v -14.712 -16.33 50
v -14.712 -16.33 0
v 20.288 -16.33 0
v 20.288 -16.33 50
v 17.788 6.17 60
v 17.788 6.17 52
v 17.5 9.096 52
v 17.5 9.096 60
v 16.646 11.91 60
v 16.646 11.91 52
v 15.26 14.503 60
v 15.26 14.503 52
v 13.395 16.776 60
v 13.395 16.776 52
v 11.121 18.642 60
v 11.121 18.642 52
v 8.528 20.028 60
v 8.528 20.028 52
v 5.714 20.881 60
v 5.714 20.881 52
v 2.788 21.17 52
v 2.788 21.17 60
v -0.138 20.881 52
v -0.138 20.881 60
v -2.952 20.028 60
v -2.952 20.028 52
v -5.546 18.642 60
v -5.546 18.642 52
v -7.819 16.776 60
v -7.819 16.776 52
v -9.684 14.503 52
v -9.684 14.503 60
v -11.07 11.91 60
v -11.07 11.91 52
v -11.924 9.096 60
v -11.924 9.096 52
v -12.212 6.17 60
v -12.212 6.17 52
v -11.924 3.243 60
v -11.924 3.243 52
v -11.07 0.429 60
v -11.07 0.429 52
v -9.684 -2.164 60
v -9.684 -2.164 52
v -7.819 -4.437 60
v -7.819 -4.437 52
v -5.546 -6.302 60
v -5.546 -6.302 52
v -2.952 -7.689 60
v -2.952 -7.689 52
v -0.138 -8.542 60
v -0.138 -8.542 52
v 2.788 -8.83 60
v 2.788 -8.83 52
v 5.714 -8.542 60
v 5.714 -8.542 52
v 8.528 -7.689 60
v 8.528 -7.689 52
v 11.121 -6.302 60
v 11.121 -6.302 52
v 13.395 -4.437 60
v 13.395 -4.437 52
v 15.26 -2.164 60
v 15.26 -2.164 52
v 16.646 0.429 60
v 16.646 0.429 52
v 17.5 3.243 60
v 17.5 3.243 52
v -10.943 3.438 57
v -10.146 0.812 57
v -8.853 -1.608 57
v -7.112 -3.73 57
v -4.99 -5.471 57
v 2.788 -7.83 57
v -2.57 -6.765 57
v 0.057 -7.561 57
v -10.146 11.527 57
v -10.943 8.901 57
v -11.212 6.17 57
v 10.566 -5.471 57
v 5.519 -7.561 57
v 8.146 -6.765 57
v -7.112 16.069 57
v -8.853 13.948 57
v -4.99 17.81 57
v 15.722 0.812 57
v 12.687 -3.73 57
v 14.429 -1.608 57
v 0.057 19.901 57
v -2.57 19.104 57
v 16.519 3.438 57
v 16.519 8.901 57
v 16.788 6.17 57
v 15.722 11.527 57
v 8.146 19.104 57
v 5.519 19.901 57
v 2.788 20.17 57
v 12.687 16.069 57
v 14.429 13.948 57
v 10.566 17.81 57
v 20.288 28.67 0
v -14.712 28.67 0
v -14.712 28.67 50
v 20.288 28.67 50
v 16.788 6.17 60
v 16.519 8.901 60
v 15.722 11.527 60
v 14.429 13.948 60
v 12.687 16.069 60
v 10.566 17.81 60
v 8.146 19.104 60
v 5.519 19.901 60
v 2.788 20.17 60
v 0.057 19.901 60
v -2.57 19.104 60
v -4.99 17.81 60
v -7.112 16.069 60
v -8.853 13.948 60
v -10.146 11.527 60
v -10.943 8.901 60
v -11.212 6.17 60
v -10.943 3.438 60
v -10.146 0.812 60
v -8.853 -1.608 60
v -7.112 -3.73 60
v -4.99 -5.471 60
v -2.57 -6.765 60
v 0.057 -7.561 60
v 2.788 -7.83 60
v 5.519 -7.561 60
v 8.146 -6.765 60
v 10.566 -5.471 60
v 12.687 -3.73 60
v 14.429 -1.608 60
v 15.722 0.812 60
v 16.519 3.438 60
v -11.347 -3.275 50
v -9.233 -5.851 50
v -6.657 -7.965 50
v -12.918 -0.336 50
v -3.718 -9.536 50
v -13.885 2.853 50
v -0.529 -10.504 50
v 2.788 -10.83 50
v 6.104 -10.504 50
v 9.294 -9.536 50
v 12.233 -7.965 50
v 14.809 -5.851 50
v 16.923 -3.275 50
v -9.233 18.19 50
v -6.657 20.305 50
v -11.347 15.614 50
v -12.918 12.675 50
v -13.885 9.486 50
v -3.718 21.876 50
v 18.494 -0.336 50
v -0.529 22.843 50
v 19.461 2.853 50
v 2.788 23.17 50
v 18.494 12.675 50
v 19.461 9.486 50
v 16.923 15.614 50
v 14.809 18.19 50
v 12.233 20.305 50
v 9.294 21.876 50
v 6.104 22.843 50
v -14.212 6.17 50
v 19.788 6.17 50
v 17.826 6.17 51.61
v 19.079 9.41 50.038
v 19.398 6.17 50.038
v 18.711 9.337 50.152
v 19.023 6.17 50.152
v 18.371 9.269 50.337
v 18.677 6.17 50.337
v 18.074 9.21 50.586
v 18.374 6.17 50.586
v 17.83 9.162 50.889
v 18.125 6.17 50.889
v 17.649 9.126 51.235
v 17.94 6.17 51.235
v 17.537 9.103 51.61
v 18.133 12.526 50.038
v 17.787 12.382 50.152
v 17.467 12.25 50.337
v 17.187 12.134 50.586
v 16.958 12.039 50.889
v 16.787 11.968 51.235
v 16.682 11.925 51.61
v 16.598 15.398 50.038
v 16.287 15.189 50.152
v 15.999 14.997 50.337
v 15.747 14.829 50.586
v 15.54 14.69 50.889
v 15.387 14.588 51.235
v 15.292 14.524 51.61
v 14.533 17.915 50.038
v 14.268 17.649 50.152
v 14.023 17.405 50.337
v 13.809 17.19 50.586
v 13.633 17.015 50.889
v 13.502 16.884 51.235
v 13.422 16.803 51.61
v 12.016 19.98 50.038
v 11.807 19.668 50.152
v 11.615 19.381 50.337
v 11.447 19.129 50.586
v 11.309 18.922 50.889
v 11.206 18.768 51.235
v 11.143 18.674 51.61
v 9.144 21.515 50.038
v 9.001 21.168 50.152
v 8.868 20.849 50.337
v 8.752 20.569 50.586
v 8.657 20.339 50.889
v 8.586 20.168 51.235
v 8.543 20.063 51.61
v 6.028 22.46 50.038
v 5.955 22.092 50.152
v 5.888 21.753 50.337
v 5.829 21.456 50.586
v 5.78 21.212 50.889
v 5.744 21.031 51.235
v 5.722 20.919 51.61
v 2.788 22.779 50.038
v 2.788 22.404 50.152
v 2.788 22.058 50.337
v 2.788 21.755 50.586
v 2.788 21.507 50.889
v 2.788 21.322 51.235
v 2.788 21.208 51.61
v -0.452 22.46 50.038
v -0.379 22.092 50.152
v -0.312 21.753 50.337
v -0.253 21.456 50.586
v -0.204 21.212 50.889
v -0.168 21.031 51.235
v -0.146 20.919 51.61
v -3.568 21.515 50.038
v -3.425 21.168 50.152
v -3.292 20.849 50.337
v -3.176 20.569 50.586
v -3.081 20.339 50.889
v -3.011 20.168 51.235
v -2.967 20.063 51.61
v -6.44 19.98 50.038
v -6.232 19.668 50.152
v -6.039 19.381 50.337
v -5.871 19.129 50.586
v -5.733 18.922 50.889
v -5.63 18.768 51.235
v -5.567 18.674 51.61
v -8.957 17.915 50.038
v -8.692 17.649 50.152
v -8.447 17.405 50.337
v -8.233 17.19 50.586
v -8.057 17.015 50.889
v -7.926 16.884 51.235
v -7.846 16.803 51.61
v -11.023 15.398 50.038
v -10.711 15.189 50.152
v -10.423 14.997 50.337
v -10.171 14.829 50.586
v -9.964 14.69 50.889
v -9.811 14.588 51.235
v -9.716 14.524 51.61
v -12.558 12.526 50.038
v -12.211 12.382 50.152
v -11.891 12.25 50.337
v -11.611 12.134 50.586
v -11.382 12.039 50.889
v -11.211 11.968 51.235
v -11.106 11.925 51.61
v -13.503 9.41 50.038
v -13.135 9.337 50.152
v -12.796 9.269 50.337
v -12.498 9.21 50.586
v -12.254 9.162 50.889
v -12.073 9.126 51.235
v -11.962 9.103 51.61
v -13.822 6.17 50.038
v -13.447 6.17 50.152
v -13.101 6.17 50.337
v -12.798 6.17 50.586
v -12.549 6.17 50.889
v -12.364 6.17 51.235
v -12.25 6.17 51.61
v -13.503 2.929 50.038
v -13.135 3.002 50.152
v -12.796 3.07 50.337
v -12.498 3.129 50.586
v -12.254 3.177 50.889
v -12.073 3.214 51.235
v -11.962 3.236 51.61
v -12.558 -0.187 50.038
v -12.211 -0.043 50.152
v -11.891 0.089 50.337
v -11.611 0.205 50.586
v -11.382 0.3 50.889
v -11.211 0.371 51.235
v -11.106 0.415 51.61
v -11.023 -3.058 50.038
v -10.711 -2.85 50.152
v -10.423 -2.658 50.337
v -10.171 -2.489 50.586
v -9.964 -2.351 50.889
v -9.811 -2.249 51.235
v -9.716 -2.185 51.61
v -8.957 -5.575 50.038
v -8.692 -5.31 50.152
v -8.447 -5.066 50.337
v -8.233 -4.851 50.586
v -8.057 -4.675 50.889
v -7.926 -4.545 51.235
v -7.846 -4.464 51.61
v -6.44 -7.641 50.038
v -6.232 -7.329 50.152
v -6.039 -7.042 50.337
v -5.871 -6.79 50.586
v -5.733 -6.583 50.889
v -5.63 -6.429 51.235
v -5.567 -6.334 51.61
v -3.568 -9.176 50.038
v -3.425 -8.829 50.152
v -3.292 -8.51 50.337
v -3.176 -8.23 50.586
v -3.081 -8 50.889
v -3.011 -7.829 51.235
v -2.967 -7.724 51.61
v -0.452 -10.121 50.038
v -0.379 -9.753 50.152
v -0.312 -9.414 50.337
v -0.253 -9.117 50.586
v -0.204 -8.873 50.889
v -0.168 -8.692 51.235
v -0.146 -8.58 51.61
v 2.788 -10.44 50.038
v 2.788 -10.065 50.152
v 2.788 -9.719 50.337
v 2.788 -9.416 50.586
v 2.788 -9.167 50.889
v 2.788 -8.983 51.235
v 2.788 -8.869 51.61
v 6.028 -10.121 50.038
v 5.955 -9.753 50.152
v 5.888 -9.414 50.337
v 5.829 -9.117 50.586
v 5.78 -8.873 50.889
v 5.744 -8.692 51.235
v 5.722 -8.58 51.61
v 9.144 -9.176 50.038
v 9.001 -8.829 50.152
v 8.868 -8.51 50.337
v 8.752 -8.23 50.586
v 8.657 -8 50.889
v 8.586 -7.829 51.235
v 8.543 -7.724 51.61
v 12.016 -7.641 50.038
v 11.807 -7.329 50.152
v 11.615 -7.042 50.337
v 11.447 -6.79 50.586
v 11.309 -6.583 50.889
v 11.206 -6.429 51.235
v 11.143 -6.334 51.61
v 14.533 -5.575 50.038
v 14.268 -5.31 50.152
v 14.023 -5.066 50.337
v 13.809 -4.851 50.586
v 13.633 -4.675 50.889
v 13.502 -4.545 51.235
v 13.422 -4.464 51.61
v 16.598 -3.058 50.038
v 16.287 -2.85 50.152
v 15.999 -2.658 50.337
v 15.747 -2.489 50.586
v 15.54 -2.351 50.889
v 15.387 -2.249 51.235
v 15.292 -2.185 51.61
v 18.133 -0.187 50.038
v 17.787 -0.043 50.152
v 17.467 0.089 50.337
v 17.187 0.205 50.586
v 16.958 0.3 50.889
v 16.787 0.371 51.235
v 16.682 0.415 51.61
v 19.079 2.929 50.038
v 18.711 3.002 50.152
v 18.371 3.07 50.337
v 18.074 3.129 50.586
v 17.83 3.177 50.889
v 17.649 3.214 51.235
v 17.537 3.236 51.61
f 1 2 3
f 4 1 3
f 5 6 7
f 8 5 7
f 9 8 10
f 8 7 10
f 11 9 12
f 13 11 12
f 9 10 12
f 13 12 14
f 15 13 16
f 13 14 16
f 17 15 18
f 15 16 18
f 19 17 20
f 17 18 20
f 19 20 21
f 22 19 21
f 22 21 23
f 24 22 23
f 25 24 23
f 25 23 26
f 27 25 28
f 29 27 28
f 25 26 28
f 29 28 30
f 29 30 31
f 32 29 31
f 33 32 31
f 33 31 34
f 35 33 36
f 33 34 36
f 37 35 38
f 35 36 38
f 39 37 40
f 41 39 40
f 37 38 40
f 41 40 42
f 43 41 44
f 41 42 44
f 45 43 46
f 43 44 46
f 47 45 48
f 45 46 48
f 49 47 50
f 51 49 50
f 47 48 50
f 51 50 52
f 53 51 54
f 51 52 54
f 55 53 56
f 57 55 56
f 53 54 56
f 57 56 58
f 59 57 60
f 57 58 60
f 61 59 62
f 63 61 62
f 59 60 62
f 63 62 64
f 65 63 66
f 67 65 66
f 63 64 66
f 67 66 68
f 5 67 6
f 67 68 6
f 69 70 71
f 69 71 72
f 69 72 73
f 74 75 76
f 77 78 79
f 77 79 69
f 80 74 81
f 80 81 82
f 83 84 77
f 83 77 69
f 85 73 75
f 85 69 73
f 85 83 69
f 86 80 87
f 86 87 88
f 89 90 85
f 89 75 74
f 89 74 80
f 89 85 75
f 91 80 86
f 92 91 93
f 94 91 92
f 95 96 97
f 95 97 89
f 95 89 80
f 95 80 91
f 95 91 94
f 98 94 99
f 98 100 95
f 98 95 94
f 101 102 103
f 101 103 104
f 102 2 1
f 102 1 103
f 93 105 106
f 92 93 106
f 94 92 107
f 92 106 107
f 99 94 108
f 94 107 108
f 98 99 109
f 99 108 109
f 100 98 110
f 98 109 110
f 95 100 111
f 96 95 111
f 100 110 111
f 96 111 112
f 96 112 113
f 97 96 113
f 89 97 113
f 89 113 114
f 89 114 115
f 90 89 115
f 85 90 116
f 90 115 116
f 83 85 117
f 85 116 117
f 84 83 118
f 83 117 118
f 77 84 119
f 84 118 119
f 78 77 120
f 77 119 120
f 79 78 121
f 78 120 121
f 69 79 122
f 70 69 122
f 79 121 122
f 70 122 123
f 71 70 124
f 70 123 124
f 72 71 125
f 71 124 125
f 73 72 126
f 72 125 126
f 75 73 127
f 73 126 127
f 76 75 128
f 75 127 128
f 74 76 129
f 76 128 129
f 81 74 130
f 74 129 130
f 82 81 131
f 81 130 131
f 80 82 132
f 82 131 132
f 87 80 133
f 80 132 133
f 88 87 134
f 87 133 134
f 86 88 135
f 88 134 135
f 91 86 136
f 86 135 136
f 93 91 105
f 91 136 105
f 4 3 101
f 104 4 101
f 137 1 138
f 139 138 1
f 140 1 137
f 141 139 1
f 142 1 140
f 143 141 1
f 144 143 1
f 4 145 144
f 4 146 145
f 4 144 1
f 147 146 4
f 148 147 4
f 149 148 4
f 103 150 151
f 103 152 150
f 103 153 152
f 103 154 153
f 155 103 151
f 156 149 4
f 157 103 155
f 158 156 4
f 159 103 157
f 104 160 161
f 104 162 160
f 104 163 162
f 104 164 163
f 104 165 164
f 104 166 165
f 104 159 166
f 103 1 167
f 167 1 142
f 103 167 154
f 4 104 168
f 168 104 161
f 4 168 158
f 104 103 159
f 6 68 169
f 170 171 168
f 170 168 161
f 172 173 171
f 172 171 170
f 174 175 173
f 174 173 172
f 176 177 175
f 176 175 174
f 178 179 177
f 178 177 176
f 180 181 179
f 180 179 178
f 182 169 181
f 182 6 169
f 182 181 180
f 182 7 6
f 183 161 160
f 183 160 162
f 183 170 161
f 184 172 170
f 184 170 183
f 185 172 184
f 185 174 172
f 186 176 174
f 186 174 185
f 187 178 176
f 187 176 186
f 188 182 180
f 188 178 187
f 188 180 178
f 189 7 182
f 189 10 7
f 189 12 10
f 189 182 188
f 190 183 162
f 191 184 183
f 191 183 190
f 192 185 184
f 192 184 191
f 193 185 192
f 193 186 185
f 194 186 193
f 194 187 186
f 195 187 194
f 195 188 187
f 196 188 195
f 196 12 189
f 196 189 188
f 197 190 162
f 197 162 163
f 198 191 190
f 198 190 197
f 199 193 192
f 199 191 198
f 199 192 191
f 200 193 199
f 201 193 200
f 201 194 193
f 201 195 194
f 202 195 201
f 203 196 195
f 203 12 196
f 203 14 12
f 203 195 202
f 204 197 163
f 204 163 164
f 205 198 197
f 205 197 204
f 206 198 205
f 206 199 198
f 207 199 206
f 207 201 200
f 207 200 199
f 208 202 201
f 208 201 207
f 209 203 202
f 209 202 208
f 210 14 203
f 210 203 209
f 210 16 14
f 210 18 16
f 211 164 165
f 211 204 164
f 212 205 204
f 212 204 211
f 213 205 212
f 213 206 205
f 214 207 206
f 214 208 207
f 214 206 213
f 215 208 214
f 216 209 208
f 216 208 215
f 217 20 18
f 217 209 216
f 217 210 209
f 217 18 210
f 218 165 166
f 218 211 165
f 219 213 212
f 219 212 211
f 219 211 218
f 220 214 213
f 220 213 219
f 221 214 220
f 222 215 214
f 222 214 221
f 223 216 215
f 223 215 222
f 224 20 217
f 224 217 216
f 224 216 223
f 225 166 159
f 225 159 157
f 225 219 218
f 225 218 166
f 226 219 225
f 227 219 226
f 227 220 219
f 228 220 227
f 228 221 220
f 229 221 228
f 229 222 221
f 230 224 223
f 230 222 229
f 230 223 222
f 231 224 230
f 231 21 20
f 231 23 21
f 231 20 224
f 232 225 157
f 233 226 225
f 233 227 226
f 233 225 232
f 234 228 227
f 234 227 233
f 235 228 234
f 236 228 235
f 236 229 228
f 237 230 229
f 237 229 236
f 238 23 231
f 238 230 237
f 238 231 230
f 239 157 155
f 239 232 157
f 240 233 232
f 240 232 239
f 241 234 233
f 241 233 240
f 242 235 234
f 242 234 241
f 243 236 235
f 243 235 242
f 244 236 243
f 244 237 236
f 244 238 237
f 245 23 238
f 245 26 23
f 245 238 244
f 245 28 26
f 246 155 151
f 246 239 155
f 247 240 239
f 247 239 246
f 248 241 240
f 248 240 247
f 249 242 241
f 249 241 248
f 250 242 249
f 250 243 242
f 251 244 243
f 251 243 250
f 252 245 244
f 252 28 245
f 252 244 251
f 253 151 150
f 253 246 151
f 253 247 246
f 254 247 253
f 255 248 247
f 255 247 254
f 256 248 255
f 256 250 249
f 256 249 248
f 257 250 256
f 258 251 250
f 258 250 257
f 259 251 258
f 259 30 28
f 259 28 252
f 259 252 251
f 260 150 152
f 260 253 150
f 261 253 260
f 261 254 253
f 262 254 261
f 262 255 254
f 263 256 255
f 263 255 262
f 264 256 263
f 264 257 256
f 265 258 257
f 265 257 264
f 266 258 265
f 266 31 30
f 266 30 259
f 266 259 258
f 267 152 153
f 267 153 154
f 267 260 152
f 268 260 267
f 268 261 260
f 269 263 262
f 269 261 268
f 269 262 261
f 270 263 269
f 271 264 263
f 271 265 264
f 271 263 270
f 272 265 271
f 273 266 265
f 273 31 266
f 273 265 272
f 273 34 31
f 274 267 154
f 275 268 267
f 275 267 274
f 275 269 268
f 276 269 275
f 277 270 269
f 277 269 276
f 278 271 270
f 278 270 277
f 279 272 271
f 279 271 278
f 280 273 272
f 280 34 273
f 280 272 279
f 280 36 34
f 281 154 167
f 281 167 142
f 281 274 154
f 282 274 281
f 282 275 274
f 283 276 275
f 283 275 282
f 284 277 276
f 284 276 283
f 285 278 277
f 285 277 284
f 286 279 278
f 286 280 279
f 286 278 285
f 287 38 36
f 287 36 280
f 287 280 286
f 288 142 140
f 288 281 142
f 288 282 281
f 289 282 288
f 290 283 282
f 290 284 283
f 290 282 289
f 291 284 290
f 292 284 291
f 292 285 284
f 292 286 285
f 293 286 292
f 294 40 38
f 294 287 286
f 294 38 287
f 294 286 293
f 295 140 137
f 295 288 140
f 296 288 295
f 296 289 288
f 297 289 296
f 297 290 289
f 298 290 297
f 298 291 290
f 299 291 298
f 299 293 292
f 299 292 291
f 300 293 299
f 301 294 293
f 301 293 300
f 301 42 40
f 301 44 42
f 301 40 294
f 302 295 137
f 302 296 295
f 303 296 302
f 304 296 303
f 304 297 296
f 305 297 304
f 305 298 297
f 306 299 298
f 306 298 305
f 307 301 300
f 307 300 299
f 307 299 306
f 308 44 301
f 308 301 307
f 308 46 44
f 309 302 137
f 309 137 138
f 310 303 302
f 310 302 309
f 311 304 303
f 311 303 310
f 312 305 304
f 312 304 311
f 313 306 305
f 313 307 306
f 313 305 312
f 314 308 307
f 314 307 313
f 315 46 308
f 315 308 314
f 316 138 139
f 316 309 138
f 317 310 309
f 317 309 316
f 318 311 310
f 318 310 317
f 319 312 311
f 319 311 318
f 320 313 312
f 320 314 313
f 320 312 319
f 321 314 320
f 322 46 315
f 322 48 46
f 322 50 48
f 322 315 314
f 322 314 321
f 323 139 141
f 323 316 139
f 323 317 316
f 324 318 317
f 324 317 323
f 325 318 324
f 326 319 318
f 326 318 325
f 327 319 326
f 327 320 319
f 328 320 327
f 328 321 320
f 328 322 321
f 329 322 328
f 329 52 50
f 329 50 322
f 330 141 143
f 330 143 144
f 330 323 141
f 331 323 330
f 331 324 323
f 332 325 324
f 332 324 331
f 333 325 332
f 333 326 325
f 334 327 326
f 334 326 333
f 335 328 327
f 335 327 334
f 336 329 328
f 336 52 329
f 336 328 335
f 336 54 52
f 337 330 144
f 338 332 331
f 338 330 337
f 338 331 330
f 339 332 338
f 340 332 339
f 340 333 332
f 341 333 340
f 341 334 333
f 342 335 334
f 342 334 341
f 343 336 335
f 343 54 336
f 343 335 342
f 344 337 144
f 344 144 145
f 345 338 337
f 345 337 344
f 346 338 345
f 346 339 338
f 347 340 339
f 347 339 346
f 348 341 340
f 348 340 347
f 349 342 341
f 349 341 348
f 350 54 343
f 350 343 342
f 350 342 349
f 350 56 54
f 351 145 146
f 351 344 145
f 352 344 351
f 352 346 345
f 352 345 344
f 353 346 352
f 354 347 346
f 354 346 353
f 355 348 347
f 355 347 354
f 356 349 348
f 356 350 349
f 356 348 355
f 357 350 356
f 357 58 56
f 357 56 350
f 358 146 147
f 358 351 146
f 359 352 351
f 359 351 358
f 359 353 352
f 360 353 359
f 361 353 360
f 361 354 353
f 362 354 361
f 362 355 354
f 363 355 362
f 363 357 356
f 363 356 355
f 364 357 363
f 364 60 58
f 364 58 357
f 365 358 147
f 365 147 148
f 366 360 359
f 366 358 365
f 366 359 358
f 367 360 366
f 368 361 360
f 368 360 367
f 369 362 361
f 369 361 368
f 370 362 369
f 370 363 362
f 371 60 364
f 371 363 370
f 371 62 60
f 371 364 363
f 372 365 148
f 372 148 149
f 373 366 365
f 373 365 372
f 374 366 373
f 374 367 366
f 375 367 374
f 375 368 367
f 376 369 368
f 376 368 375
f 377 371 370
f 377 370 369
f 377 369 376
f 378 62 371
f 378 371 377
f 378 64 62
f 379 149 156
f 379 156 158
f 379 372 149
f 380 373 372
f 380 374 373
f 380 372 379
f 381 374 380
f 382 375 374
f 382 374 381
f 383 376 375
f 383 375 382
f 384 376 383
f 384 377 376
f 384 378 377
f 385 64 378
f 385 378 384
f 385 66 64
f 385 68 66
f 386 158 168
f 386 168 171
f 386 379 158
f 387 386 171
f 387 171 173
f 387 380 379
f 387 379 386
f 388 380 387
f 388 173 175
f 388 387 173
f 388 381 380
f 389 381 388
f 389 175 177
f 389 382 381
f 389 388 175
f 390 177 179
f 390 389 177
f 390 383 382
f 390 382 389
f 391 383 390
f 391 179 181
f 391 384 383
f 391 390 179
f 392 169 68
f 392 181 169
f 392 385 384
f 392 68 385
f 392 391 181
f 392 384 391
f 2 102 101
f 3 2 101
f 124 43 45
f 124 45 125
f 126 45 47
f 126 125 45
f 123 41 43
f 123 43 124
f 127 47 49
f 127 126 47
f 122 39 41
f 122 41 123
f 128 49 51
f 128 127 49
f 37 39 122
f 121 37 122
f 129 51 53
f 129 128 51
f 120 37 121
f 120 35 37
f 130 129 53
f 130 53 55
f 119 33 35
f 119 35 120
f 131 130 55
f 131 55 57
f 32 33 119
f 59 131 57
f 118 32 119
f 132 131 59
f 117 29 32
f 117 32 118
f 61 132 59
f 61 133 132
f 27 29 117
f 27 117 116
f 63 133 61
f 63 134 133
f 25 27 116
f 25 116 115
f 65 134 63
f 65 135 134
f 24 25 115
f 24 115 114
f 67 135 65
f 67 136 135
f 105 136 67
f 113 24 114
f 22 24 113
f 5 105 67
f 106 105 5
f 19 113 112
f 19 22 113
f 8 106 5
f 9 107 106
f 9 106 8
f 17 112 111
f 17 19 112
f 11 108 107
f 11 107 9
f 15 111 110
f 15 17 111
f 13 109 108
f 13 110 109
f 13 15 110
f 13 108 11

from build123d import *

# Parameters (mm, degrees)
SKETCH_W     = 35
SKETCH_H     = 45
PAD_DEPTH    = 50
SKETCH001_R  = 15
PAD001_DEPTH = 10
SKETCH002_R  = 14
POCKET_DEPTH = 3
FILLET_R     = 2


with BuildPart() as part:
    # Sketch → Pad (new body)
    with BuildSketch(Plane.XY):
        with Locations((2.787933, 6.169585)):
            Rectangle(SKETCH_W, SKETCH_H)
    extrude(amount=PAD_DEPTH)

    # Sketch001 (on Face6 of Pad) → Pad001 (join)
    with BuildSketch(Plane.XY.offset(50)):
        with Locations((2.787933, 6.169585)):
            Circle(SKETCH001_R)
    extrude(amount=PAD001_DEPTH)

    # Sketch002 (on Face8 of Pad001) → Pocket (cut)
    with BuildSketch(Plane.XY.offset(60)):
        with Locations((2.787933, 6.169585)):
            Circle(SKETCH002_R)
    extrude(amount=-POCKET_DEPTH, mode=Mode.SUBTRACT)

    # Fillet
    fillet_edges = [part.edges().sort_by_distance(p)[0] for p in [
        (-12.212067, 6.169585, 50),
    ]]
    fillet(fillet_edges, radius=FILLET_R)


solid = part.part
